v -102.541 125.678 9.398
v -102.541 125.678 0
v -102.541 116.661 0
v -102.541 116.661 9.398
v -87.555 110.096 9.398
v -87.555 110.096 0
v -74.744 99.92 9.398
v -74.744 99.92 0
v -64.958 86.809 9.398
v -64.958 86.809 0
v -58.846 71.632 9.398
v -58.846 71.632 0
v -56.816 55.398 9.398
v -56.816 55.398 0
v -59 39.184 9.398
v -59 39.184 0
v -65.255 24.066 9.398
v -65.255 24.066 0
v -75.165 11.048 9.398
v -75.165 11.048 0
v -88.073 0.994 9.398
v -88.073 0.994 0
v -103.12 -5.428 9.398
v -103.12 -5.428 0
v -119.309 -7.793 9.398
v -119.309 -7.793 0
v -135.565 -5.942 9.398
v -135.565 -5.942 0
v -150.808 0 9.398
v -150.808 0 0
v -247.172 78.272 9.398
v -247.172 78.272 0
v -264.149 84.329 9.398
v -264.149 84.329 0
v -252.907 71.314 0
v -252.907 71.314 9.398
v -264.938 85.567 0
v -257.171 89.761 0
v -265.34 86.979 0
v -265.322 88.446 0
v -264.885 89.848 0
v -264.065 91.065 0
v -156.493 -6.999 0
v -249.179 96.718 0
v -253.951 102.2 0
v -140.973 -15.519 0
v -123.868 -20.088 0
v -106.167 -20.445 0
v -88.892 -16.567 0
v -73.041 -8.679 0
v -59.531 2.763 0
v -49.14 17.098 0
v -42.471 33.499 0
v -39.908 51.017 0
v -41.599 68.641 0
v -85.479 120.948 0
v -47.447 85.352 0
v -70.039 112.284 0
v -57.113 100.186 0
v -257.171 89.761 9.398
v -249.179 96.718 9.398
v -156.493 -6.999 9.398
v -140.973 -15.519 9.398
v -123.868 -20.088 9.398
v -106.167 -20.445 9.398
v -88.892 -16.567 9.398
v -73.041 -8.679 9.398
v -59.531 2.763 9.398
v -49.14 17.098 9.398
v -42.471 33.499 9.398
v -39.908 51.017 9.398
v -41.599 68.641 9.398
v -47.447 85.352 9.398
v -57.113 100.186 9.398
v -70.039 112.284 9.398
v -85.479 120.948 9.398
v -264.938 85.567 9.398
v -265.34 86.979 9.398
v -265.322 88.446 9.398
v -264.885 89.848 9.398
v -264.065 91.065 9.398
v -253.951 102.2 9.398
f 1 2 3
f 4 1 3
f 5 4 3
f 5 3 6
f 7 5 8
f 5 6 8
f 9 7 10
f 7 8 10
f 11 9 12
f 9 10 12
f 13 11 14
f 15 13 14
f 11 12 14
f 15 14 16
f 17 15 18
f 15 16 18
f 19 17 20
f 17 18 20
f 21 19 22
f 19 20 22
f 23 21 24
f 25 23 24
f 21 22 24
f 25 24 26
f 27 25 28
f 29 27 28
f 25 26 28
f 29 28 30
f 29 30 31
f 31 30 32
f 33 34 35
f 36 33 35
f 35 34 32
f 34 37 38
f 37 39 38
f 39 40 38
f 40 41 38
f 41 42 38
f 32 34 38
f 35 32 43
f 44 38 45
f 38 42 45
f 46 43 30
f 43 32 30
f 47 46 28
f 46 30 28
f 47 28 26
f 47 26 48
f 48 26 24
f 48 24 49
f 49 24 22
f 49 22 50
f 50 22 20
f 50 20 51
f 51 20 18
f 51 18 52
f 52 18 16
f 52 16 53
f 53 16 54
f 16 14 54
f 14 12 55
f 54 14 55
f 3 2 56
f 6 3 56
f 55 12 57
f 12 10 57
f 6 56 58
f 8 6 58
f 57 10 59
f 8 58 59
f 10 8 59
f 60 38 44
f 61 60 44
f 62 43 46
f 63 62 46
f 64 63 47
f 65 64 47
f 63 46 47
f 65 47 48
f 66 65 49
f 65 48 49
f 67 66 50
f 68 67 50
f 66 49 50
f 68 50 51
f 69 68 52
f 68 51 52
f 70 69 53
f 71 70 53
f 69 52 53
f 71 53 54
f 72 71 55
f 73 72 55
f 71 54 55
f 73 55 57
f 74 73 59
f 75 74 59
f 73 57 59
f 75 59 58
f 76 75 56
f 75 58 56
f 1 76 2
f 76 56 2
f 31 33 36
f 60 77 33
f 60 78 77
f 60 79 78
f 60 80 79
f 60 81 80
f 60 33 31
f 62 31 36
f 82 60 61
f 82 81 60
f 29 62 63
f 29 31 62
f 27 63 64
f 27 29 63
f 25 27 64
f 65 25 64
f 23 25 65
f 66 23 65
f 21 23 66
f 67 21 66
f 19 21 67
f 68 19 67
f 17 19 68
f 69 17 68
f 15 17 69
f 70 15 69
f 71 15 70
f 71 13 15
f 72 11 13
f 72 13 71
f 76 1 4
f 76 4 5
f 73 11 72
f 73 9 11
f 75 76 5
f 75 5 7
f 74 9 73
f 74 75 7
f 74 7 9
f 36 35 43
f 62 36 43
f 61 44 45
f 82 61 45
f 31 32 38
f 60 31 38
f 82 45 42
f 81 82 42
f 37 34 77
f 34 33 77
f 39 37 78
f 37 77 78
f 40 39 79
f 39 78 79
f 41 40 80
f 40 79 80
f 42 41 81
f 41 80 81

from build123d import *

# Parameters (mm, degrees)
F1_DEPTH = 9.398
F2_DEPTH = 9.398
F3_R     = 5.08


with BuildPart() as f1:
    # F0 (on Top) → F1 (new body)
    with BuildSketch(Plane.XY):
        Polygon((-252.907044, 71.313885), (-156.493339, -6.999044), (-150.8083, 0), (-247.171892, 78.272225), align=None)
        with BuildLine():
            Line((-150.8083, 0), (-156.493339, -6.999044))
            ThreePointArc((-156.493339, -6.999044), (-45.311266, 25.097468), (-102.540672, 125.677956))
            Line((-102.540672, 125.677956), (-102.540672, 116.660956))
            ThreePointArc((-102.540672, 116.660956), (-61.639012, 31.42252), (-150.8083, 0))
        make_face()
    extrude(amount=F1_DEPTH)

    # F0 (on Top) → F2 (join)
    with BuildSketch(Plane.XY):
        with BuildLine():
            Line((-150.8083, 0), (-156.493339, -6.999044))
            ThreePointArc((-156.493339, -6.999044), (-45.311266, 25.097468), (-102.540672, 125.677956))
            Line((-102.540672, 125.677956), (-102.540672, 116.660956))
            ThreePointArc((-102.540672, 116.660956), (-61.639012, 31.42252), (-150.8083, 0))
        make_face()
        Polygon((-252.907044, 71.313885), (-156.493339, -6.999044), (-150.8083, 0), (-247.171892, 78.272225), align=None)
        Polygon((-267.090976, 87.734386), (-252.907044, 71.313885), (-247.171892, 78.272225), (-257.171273, 89.76128), (-249.178657, 96.717571), (-253.950546, 102.200361), align=None)
    extrude(amount=F2_DEPTH)

    # F3
    f3_edges = [f1.edges().sort_by_distance(p)[0] for p in [
        (-267.090976, 87.734386, 4.699),
    ]]
    fillet(f3_edges, radius=F3_R)


solid = f1.part
